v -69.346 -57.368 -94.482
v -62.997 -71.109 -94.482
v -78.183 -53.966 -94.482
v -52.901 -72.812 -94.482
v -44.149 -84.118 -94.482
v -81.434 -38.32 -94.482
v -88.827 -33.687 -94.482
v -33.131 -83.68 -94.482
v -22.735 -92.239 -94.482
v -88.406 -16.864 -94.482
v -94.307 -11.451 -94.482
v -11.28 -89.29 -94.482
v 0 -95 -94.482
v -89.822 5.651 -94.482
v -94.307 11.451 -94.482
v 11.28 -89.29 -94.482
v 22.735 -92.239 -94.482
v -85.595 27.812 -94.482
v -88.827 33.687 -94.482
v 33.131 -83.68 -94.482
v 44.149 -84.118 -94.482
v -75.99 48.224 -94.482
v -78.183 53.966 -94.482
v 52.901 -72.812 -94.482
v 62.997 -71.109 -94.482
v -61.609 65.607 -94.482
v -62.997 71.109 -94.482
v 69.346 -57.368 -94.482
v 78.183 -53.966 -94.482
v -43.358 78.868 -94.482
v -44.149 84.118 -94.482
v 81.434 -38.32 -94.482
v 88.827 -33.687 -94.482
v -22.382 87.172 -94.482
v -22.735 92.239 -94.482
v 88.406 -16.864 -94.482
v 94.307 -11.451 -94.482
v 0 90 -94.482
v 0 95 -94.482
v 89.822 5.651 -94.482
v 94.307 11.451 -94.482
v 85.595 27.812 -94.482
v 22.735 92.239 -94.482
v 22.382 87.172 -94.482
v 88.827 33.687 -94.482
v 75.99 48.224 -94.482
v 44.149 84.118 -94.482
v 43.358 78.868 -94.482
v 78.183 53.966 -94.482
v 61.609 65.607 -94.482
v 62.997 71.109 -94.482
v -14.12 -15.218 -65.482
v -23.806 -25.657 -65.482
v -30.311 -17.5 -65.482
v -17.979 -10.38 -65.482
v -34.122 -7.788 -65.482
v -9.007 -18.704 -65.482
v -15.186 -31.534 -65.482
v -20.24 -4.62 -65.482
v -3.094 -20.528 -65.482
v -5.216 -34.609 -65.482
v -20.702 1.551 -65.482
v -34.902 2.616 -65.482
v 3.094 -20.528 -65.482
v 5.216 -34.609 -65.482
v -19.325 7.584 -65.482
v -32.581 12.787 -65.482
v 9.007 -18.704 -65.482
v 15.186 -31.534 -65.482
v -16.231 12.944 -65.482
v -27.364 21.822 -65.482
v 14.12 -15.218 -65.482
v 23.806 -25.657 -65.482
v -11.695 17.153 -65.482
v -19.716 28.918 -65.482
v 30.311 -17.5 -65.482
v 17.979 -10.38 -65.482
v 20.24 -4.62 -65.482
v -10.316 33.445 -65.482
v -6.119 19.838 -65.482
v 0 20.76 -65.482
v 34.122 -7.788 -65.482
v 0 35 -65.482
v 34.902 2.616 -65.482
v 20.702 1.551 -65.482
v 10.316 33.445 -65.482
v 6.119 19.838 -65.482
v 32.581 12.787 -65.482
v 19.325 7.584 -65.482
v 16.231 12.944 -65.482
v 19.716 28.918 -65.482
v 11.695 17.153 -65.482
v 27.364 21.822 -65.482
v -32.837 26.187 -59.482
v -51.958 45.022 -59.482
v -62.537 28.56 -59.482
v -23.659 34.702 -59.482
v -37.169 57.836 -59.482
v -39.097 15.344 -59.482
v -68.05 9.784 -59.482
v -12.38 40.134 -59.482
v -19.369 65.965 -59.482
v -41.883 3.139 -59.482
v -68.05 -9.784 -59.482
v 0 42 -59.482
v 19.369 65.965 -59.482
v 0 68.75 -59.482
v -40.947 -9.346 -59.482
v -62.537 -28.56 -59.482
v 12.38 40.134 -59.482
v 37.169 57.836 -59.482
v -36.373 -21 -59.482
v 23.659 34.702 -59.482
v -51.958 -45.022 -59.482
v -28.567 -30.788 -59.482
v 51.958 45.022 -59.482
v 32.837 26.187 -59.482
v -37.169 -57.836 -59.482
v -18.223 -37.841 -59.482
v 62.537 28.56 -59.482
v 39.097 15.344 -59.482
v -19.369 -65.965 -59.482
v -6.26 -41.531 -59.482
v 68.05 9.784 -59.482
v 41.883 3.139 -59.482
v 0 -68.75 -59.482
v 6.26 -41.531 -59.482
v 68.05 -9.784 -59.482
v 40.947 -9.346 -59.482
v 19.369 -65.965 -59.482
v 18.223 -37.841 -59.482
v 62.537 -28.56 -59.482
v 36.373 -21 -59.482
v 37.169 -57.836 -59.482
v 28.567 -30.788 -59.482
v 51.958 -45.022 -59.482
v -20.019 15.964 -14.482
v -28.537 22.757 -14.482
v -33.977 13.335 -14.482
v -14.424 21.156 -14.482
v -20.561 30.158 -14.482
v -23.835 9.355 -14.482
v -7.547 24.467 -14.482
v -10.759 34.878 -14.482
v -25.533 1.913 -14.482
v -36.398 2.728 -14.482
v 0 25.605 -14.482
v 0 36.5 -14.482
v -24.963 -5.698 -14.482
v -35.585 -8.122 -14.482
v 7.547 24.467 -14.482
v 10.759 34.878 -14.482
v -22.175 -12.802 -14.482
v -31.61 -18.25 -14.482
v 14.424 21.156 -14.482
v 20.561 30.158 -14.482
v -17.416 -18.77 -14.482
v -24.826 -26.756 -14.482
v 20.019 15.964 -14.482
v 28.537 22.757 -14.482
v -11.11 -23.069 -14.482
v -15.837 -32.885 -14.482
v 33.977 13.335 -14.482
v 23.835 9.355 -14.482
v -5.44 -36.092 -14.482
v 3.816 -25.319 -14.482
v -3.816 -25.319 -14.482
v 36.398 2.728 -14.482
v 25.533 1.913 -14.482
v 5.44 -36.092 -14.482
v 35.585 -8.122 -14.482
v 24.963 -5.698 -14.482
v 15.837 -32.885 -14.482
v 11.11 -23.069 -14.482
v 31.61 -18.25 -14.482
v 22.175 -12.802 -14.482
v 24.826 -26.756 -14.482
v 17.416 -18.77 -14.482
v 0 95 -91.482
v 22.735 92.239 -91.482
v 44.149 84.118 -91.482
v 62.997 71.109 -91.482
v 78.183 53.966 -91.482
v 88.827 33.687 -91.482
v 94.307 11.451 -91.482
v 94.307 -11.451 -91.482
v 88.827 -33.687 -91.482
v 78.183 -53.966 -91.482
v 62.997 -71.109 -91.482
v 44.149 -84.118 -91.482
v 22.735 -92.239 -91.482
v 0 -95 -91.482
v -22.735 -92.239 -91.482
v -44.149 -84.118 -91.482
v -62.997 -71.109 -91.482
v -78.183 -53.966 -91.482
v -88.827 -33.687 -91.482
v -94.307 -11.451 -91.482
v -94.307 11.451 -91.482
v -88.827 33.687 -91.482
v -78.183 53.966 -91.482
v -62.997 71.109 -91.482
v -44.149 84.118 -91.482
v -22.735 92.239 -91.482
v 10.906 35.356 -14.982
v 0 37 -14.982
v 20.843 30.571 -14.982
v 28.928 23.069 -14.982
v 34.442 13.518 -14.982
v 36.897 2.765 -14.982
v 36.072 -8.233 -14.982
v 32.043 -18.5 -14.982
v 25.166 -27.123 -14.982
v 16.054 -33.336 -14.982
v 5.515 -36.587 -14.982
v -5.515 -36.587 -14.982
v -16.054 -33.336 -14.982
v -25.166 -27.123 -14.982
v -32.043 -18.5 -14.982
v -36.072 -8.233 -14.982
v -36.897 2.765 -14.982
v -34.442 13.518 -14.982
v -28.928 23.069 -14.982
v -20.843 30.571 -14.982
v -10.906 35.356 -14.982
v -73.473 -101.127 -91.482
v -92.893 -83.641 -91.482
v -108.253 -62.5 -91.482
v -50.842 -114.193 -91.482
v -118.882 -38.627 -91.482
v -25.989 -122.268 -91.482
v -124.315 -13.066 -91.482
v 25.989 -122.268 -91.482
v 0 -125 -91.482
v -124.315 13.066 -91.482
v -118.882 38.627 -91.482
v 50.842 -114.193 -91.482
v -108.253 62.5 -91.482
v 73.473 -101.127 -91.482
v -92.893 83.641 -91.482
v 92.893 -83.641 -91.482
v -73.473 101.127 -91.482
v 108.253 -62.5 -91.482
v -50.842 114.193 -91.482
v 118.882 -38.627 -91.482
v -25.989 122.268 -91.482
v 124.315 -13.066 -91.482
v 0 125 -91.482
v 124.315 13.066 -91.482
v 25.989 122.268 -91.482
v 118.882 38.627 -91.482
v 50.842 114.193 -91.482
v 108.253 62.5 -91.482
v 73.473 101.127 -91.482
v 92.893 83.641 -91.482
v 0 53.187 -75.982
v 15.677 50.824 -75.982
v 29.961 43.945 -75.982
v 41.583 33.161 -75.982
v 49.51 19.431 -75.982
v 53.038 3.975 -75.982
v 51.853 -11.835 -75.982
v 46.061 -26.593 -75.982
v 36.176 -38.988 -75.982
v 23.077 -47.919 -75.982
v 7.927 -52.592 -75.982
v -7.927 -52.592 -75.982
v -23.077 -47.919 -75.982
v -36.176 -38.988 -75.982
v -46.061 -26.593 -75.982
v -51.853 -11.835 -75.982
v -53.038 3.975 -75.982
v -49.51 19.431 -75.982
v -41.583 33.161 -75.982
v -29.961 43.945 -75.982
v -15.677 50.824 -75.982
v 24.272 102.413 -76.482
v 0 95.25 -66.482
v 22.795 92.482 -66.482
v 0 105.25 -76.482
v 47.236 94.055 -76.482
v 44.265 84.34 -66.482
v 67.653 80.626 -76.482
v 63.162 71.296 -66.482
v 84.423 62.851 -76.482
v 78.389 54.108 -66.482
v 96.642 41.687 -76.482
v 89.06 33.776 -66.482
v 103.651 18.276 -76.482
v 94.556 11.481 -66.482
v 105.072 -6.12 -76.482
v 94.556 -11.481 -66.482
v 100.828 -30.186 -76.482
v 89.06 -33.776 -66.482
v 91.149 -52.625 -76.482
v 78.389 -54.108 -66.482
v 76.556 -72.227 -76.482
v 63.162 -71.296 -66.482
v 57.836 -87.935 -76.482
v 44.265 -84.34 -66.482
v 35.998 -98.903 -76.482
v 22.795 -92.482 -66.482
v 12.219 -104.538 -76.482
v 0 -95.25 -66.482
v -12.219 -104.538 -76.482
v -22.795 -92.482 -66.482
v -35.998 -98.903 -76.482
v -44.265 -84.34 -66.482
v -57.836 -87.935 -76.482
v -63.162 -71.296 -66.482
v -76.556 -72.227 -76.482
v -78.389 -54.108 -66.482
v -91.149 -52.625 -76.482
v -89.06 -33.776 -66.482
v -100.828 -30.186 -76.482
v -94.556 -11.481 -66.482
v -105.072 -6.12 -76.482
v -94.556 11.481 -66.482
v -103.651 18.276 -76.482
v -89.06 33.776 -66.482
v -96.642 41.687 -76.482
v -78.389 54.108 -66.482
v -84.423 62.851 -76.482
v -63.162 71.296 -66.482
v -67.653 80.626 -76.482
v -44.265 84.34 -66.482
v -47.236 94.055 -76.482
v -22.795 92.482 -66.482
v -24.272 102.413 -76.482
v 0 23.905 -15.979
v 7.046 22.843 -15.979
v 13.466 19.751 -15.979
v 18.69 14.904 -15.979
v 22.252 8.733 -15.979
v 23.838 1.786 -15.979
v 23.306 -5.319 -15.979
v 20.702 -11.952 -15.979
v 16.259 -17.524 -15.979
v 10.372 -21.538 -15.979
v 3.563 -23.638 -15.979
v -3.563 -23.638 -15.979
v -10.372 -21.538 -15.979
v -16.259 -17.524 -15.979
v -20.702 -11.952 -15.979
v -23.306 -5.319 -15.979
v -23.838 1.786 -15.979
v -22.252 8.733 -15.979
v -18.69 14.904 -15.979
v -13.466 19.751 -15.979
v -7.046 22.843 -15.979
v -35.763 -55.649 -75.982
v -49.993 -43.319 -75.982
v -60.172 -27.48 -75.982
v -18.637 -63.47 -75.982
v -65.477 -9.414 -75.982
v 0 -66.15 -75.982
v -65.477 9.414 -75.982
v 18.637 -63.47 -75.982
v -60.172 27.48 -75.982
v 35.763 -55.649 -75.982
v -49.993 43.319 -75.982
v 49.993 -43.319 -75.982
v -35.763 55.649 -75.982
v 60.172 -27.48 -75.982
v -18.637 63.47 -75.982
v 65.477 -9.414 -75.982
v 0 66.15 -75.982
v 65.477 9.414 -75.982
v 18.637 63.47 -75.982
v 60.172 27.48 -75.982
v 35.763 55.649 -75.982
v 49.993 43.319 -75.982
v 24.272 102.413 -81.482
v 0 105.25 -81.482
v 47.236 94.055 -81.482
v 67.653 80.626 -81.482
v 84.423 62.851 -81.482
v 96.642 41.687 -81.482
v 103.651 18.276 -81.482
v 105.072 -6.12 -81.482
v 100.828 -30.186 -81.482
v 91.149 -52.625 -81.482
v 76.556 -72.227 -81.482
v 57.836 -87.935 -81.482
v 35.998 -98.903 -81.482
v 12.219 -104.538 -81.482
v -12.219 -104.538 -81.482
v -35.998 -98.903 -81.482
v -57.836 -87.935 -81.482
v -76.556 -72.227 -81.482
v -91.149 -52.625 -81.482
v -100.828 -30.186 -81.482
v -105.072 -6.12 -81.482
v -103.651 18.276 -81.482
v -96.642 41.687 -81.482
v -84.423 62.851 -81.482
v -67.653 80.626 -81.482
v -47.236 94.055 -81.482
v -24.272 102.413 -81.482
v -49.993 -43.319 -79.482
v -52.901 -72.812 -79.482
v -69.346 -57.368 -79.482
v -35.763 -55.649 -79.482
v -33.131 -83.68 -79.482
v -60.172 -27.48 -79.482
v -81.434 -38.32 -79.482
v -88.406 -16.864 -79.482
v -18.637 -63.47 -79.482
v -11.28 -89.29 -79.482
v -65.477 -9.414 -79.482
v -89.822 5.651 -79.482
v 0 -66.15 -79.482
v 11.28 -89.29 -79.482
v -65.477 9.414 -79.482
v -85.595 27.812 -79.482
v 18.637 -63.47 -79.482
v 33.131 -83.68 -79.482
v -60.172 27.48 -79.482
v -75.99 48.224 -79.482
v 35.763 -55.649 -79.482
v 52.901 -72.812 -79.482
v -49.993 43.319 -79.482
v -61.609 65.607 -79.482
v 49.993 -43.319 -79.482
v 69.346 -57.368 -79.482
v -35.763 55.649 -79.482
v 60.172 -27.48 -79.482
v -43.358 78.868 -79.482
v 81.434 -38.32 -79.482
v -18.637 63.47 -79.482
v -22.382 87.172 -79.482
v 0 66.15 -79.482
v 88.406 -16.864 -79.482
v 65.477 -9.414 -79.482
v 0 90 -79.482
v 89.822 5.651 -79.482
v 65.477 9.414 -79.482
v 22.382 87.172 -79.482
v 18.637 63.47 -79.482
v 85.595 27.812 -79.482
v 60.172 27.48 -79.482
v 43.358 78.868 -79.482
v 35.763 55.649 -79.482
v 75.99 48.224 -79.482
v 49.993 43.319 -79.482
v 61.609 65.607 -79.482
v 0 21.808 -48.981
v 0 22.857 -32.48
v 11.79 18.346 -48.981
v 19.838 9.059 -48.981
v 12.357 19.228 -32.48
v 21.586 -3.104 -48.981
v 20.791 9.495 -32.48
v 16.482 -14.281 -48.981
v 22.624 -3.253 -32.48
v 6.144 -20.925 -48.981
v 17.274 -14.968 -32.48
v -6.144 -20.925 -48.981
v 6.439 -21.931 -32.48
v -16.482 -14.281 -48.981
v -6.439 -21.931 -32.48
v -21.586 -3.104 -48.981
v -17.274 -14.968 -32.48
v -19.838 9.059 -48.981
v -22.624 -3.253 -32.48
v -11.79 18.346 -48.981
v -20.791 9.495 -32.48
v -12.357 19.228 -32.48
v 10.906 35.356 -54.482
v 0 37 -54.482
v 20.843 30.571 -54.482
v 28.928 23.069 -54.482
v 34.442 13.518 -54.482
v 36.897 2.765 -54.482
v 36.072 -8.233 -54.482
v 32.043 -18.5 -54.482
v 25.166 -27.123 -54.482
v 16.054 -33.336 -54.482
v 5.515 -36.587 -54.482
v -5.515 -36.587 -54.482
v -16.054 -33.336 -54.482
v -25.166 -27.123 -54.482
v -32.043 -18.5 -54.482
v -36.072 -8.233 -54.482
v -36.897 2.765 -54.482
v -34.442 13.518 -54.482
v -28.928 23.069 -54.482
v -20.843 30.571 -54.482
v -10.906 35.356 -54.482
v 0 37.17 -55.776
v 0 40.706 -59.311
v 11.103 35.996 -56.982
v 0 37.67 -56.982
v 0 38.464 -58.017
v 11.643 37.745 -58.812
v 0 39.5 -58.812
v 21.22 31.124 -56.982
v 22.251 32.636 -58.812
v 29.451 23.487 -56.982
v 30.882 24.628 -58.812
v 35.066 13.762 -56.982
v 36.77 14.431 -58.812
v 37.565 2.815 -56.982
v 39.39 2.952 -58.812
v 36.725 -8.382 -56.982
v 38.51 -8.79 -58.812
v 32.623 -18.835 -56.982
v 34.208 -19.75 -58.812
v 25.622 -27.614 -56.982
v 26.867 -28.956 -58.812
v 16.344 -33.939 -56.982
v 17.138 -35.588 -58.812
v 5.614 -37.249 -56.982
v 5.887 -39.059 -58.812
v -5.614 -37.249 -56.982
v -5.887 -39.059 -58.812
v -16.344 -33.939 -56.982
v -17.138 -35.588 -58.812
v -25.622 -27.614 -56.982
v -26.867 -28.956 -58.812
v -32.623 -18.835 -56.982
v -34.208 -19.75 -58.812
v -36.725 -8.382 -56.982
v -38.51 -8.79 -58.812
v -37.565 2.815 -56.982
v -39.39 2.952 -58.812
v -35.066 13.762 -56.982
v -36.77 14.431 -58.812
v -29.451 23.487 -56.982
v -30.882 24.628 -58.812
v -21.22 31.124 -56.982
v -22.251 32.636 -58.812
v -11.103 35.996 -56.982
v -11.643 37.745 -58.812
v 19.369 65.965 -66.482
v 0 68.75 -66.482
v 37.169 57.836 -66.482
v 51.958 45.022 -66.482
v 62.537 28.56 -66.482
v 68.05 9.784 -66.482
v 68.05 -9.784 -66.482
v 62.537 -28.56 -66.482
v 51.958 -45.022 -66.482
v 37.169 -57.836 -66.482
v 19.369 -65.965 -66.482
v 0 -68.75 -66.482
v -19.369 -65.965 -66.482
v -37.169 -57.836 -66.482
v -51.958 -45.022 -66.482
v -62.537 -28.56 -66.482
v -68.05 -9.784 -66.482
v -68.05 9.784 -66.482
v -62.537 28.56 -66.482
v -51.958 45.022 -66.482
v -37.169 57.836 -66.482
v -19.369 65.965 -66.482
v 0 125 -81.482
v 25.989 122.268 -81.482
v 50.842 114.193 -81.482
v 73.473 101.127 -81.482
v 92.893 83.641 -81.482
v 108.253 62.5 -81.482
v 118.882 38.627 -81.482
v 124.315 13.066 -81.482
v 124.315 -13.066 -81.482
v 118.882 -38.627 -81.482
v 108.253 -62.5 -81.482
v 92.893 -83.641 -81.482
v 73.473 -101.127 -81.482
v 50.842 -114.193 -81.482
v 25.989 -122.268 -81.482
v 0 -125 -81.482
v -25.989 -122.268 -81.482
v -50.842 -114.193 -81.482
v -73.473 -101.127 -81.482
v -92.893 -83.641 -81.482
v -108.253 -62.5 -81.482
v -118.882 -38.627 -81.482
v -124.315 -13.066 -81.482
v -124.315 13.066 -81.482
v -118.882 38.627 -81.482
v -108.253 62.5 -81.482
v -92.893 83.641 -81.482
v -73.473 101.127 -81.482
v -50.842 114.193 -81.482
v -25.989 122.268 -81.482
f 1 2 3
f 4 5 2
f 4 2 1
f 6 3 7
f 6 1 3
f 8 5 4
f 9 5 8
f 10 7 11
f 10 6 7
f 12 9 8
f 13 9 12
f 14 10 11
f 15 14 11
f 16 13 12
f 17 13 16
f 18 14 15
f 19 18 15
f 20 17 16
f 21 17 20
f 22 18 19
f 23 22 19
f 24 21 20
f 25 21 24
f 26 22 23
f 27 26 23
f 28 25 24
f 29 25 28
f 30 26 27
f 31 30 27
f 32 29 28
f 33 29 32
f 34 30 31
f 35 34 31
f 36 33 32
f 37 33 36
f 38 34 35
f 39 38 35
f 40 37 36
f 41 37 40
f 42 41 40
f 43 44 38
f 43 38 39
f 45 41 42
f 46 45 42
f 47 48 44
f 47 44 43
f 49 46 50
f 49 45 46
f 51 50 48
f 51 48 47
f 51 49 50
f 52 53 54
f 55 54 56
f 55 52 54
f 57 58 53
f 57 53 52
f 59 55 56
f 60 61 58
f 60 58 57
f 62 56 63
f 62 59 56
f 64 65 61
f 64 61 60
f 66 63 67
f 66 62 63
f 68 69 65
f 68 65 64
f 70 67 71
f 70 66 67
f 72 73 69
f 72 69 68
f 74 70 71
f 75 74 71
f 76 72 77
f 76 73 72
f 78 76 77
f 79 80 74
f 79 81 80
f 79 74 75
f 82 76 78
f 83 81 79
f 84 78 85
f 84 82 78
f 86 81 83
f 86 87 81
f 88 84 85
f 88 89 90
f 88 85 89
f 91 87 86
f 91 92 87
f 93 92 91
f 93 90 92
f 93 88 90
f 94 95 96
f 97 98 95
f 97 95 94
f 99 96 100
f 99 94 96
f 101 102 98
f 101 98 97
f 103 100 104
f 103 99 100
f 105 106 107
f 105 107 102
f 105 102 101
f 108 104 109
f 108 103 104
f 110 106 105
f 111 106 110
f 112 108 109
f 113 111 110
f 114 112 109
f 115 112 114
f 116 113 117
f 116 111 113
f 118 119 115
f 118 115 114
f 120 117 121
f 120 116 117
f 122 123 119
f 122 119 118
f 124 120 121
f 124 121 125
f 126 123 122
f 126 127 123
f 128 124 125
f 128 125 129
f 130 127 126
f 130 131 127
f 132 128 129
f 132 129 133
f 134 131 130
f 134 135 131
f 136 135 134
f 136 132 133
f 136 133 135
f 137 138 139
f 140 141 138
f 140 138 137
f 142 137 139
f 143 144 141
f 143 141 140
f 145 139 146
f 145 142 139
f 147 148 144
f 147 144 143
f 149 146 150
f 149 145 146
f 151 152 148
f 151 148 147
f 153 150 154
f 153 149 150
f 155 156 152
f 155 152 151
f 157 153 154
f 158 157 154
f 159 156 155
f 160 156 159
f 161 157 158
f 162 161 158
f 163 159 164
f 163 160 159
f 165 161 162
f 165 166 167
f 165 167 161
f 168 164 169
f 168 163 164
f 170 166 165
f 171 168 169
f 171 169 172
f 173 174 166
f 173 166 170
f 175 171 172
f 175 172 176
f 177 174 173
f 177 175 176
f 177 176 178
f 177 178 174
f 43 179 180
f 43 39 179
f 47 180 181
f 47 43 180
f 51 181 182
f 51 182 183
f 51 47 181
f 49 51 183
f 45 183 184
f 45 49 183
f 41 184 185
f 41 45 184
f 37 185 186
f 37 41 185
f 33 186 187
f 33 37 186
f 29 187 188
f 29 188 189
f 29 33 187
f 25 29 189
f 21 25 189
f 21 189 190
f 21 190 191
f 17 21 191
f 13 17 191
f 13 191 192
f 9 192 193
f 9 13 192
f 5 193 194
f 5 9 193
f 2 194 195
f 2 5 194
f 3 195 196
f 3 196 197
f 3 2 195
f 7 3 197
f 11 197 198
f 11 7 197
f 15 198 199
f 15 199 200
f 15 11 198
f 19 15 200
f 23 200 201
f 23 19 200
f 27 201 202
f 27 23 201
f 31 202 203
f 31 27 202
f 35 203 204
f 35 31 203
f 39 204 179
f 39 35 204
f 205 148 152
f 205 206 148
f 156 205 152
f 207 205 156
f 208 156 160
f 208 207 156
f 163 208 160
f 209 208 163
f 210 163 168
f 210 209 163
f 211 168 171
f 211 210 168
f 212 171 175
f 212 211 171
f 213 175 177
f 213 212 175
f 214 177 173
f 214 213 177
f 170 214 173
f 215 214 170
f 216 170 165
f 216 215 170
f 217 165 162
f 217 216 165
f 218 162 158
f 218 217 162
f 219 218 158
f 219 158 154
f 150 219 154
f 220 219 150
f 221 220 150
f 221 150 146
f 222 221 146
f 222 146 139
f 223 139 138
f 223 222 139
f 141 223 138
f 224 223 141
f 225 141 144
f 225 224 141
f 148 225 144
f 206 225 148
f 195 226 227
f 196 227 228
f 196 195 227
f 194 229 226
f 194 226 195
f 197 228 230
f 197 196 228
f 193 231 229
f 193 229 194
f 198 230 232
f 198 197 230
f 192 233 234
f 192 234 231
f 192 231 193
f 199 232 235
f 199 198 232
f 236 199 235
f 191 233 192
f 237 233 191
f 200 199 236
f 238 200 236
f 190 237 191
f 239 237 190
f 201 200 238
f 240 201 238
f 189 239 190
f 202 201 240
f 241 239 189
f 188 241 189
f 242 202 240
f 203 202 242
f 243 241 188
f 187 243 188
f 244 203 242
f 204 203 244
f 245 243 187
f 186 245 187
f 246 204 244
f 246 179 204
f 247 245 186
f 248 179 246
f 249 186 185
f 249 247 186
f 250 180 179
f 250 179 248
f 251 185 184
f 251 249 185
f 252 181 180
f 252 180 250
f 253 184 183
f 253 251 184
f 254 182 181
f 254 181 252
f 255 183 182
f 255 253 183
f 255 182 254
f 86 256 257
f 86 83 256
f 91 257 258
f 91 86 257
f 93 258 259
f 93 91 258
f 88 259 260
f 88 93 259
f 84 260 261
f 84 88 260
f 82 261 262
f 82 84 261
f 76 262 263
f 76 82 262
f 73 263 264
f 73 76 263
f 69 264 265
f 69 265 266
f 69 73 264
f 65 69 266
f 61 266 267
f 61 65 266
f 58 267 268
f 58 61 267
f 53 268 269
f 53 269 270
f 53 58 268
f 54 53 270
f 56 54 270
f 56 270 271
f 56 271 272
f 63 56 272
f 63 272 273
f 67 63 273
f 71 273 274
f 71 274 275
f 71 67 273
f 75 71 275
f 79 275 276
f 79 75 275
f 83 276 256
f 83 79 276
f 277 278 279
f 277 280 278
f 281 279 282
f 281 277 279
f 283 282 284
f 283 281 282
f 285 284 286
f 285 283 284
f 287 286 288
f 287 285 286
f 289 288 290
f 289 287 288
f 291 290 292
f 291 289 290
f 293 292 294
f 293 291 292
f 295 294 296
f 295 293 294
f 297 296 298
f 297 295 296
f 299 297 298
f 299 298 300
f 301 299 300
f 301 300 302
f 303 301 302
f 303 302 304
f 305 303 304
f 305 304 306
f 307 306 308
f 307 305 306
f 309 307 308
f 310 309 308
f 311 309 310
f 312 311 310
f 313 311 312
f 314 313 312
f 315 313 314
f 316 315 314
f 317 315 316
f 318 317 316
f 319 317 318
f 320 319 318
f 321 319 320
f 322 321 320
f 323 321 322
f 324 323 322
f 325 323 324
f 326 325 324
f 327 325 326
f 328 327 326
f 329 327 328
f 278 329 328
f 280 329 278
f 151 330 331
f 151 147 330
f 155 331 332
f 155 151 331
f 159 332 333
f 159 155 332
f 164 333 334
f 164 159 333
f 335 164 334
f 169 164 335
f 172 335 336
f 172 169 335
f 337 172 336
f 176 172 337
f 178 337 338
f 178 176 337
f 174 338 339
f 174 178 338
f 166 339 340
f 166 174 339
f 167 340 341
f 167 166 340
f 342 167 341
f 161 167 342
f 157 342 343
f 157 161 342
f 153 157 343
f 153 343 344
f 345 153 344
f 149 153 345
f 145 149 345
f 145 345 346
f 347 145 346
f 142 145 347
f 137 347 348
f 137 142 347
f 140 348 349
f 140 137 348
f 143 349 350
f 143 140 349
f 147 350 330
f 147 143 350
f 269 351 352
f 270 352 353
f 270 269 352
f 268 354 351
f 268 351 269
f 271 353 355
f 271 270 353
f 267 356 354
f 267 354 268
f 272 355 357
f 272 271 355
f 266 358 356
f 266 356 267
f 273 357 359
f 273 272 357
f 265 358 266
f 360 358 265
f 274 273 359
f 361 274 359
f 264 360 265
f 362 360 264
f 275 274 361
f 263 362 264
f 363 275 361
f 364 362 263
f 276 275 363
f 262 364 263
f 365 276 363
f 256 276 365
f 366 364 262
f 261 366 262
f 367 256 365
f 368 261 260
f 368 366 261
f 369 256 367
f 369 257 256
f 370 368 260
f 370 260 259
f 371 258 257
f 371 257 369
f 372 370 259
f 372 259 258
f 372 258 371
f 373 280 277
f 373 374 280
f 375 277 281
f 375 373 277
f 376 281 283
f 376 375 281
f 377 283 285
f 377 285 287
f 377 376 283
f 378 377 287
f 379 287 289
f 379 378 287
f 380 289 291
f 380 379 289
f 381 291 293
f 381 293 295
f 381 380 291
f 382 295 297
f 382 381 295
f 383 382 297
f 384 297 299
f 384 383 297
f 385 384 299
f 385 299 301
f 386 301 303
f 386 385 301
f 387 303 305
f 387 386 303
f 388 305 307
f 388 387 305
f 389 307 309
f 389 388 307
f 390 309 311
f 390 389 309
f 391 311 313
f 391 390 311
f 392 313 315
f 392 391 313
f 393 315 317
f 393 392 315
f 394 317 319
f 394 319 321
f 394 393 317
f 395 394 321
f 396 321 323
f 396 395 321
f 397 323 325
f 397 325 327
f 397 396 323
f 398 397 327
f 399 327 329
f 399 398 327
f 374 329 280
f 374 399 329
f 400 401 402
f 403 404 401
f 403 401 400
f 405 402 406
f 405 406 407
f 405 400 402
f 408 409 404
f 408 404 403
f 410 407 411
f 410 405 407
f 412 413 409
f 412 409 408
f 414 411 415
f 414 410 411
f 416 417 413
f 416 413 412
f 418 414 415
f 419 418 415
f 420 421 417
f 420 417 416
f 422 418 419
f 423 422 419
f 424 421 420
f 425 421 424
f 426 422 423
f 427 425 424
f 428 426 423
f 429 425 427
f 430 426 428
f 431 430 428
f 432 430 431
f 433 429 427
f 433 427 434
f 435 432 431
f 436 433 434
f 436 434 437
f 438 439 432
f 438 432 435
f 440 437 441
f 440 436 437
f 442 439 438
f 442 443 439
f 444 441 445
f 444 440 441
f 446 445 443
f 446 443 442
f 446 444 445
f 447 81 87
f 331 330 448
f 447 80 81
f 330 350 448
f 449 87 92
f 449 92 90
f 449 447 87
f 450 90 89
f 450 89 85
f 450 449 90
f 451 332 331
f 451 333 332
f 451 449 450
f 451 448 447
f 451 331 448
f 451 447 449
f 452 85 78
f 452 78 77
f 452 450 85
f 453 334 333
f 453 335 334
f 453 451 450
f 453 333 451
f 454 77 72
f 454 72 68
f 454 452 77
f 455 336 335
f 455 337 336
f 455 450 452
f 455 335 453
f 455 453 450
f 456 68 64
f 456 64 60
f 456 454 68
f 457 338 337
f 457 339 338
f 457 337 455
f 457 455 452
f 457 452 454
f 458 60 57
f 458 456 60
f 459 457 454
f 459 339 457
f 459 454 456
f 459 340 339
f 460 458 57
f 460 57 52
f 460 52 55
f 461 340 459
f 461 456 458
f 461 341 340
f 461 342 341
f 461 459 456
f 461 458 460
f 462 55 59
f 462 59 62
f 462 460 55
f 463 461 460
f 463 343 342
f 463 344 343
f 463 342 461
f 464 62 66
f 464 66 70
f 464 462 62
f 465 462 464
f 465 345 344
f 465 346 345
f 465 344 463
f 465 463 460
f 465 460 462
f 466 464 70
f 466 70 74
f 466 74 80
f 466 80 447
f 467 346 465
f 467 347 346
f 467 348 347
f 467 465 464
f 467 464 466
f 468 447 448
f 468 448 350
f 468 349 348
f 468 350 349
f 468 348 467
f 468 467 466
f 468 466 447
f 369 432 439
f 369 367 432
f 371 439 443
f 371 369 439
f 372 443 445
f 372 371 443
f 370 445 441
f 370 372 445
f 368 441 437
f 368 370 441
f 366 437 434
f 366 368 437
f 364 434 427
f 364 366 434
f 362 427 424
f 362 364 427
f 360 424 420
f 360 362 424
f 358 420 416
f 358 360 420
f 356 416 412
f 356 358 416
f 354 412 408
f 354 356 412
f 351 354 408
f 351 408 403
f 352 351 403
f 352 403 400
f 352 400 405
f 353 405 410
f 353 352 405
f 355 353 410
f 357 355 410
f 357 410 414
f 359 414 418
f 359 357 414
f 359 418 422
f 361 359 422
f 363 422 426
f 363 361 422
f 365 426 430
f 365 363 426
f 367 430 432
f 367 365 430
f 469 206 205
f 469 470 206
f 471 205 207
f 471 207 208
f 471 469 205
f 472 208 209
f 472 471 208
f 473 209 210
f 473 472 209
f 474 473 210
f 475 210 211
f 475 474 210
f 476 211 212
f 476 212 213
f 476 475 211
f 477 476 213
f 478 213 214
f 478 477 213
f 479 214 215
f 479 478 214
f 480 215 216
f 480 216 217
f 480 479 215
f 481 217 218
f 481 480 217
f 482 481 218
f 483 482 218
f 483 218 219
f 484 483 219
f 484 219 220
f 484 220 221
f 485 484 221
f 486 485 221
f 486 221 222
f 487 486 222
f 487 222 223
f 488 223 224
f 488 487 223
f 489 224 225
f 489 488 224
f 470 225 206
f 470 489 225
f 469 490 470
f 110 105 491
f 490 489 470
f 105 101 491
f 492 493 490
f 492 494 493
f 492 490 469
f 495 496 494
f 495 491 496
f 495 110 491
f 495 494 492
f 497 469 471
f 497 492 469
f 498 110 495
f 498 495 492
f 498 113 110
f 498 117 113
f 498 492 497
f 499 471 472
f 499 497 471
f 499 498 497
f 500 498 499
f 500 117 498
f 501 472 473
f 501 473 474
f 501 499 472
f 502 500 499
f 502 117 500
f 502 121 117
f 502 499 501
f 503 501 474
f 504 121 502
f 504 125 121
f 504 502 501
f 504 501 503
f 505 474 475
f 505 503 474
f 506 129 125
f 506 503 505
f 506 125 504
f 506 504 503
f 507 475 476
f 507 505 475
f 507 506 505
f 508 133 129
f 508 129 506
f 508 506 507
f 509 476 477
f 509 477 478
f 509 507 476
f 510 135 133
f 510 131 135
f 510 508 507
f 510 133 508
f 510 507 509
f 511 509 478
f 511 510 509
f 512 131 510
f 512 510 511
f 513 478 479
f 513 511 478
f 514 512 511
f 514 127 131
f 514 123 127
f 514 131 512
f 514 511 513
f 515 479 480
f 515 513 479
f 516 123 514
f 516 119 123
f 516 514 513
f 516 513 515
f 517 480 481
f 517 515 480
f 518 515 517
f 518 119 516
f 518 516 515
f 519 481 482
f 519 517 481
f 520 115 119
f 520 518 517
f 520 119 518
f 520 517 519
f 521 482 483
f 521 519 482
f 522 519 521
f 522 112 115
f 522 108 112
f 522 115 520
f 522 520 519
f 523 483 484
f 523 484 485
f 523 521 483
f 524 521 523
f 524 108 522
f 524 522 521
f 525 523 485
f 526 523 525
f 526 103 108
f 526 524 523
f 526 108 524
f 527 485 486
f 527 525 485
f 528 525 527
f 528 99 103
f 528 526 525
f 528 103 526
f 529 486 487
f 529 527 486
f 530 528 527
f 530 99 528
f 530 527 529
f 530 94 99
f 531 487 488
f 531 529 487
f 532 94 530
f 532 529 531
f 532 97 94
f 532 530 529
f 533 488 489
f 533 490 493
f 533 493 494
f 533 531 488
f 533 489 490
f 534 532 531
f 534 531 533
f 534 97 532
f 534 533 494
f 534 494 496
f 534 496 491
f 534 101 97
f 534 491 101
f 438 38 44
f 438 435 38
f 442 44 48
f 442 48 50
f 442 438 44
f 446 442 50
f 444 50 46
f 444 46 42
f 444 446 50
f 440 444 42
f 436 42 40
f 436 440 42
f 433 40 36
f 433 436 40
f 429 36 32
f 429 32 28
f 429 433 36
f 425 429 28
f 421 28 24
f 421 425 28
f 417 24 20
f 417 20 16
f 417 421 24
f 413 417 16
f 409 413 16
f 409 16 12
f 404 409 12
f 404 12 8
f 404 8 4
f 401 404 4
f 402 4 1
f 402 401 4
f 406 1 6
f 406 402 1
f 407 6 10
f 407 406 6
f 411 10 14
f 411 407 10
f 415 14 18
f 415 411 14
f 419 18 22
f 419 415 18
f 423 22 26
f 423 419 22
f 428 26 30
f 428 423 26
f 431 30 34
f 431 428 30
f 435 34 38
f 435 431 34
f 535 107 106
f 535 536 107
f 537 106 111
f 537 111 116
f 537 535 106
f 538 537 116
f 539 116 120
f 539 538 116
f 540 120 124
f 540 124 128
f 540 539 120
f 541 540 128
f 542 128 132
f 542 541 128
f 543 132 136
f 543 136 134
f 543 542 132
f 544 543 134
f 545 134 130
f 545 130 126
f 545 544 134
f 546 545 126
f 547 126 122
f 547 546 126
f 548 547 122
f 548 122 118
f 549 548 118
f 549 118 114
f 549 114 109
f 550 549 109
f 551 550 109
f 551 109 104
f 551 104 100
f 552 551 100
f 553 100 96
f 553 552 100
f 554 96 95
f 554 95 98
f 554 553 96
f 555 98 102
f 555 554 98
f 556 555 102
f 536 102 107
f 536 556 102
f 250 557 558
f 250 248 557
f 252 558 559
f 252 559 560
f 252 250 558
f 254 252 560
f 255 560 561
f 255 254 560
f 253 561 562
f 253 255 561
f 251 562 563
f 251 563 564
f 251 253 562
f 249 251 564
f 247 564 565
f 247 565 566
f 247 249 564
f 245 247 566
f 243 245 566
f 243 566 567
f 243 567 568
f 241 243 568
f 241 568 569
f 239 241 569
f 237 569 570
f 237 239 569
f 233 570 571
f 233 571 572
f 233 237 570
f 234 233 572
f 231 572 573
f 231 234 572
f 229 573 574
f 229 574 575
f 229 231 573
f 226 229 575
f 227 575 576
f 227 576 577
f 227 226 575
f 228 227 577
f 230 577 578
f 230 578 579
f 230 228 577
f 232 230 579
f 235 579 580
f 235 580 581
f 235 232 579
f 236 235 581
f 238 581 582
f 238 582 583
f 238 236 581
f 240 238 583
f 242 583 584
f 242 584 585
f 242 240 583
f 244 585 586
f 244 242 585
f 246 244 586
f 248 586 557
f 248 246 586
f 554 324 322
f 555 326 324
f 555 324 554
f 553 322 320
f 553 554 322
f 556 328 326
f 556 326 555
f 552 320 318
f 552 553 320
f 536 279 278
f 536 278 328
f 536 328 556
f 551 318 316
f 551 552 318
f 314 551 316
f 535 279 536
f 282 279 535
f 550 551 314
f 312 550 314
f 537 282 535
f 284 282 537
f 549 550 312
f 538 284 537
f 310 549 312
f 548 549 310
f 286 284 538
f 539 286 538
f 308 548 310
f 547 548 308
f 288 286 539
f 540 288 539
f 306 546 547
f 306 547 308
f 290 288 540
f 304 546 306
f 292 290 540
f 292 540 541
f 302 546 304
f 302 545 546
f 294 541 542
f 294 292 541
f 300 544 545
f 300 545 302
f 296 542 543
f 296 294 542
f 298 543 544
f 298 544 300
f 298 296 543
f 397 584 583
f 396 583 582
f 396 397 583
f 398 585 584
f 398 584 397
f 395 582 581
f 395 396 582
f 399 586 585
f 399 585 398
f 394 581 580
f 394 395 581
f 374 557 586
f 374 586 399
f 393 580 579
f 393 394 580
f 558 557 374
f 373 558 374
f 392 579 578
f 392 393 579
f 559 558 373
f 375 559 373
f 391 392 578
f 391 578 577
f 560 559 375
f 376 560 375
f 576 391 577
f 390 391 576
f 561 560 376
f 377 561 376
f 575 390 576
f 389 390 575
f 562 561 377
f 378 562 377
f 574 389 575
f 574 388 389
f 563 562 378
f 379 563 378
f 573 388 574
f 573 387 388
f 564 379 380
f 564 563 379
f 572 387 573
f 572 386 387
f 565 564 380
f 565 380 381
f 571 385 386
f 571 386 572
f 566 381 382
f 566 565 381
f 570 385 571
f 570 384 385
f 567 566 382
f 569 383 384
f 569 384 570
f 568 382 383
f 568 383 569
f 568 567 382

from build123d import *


with BuildPart() as part:
    # Эскиз1 → Повернуть2 (revolve)
    with BuildSketch(Plane(origin=(0, 0, 0), x_dir=(0, 0, -1), z_dir=(1, 0, 0))):
        with BuildLine():
            Line((65.481855233, 20.76), (15.978837376, 23.904897605))
            Line((15.978837376, 23.904897605), (14.481855233, 25.604987877))
            Line((14.481855233, 25.604987877), (14.481855233, 36.5))
            Line((14.481855233, 36.5), (14.981855233, 37))
            Line((14.981855233, 37), (54.481855233, 37))
            ThreePointArc((54.481855233, 37), (58.017389139, 38.464466094), (59.481855233, 42))
            Line((59.481855233, 42), (59.481855233, 68.75))
            Line((59.481855233, 68.75), (66.481855233, 68.75))
            Line((66.481855233, 68.75), (66.481855233, 95.25))
            Line((66.481855233, 95.25), (76.481855233, 105.25))
            Line((76.481855233, 105.25), (81.481855233, 105.25))
            Line((81.481855233, 105.25), (81.481855233, 125))
            Line((81.481855233, 125), (91.481855233, 125))
            Line((91.481855233, 125), (91.481855233, 95))
            Line((91.481855233, 95), (94.481855233, 95))
            Line((94.481855233, 95), (94.481855233, 90))
            Line((94.481855233, 90), (79.481855233, 90))
            Line((79.481855233, 90), (79.481855233, 66.15))
            Line((79.481855233, 66.15), (75.981855233, 66.15))
            Line((75.981855233, 66.15), (75.981855233, 53.186533479))
            Line((75.981855233, 53.186533479), (65.481855233, 35))
            Line((65.481855233, 35), (65.481855233, 20.76))
        make_face()
    revolve(axis=Axis((0, 0, -5.281550862), (0, 0, -1)))


solid = part.part
